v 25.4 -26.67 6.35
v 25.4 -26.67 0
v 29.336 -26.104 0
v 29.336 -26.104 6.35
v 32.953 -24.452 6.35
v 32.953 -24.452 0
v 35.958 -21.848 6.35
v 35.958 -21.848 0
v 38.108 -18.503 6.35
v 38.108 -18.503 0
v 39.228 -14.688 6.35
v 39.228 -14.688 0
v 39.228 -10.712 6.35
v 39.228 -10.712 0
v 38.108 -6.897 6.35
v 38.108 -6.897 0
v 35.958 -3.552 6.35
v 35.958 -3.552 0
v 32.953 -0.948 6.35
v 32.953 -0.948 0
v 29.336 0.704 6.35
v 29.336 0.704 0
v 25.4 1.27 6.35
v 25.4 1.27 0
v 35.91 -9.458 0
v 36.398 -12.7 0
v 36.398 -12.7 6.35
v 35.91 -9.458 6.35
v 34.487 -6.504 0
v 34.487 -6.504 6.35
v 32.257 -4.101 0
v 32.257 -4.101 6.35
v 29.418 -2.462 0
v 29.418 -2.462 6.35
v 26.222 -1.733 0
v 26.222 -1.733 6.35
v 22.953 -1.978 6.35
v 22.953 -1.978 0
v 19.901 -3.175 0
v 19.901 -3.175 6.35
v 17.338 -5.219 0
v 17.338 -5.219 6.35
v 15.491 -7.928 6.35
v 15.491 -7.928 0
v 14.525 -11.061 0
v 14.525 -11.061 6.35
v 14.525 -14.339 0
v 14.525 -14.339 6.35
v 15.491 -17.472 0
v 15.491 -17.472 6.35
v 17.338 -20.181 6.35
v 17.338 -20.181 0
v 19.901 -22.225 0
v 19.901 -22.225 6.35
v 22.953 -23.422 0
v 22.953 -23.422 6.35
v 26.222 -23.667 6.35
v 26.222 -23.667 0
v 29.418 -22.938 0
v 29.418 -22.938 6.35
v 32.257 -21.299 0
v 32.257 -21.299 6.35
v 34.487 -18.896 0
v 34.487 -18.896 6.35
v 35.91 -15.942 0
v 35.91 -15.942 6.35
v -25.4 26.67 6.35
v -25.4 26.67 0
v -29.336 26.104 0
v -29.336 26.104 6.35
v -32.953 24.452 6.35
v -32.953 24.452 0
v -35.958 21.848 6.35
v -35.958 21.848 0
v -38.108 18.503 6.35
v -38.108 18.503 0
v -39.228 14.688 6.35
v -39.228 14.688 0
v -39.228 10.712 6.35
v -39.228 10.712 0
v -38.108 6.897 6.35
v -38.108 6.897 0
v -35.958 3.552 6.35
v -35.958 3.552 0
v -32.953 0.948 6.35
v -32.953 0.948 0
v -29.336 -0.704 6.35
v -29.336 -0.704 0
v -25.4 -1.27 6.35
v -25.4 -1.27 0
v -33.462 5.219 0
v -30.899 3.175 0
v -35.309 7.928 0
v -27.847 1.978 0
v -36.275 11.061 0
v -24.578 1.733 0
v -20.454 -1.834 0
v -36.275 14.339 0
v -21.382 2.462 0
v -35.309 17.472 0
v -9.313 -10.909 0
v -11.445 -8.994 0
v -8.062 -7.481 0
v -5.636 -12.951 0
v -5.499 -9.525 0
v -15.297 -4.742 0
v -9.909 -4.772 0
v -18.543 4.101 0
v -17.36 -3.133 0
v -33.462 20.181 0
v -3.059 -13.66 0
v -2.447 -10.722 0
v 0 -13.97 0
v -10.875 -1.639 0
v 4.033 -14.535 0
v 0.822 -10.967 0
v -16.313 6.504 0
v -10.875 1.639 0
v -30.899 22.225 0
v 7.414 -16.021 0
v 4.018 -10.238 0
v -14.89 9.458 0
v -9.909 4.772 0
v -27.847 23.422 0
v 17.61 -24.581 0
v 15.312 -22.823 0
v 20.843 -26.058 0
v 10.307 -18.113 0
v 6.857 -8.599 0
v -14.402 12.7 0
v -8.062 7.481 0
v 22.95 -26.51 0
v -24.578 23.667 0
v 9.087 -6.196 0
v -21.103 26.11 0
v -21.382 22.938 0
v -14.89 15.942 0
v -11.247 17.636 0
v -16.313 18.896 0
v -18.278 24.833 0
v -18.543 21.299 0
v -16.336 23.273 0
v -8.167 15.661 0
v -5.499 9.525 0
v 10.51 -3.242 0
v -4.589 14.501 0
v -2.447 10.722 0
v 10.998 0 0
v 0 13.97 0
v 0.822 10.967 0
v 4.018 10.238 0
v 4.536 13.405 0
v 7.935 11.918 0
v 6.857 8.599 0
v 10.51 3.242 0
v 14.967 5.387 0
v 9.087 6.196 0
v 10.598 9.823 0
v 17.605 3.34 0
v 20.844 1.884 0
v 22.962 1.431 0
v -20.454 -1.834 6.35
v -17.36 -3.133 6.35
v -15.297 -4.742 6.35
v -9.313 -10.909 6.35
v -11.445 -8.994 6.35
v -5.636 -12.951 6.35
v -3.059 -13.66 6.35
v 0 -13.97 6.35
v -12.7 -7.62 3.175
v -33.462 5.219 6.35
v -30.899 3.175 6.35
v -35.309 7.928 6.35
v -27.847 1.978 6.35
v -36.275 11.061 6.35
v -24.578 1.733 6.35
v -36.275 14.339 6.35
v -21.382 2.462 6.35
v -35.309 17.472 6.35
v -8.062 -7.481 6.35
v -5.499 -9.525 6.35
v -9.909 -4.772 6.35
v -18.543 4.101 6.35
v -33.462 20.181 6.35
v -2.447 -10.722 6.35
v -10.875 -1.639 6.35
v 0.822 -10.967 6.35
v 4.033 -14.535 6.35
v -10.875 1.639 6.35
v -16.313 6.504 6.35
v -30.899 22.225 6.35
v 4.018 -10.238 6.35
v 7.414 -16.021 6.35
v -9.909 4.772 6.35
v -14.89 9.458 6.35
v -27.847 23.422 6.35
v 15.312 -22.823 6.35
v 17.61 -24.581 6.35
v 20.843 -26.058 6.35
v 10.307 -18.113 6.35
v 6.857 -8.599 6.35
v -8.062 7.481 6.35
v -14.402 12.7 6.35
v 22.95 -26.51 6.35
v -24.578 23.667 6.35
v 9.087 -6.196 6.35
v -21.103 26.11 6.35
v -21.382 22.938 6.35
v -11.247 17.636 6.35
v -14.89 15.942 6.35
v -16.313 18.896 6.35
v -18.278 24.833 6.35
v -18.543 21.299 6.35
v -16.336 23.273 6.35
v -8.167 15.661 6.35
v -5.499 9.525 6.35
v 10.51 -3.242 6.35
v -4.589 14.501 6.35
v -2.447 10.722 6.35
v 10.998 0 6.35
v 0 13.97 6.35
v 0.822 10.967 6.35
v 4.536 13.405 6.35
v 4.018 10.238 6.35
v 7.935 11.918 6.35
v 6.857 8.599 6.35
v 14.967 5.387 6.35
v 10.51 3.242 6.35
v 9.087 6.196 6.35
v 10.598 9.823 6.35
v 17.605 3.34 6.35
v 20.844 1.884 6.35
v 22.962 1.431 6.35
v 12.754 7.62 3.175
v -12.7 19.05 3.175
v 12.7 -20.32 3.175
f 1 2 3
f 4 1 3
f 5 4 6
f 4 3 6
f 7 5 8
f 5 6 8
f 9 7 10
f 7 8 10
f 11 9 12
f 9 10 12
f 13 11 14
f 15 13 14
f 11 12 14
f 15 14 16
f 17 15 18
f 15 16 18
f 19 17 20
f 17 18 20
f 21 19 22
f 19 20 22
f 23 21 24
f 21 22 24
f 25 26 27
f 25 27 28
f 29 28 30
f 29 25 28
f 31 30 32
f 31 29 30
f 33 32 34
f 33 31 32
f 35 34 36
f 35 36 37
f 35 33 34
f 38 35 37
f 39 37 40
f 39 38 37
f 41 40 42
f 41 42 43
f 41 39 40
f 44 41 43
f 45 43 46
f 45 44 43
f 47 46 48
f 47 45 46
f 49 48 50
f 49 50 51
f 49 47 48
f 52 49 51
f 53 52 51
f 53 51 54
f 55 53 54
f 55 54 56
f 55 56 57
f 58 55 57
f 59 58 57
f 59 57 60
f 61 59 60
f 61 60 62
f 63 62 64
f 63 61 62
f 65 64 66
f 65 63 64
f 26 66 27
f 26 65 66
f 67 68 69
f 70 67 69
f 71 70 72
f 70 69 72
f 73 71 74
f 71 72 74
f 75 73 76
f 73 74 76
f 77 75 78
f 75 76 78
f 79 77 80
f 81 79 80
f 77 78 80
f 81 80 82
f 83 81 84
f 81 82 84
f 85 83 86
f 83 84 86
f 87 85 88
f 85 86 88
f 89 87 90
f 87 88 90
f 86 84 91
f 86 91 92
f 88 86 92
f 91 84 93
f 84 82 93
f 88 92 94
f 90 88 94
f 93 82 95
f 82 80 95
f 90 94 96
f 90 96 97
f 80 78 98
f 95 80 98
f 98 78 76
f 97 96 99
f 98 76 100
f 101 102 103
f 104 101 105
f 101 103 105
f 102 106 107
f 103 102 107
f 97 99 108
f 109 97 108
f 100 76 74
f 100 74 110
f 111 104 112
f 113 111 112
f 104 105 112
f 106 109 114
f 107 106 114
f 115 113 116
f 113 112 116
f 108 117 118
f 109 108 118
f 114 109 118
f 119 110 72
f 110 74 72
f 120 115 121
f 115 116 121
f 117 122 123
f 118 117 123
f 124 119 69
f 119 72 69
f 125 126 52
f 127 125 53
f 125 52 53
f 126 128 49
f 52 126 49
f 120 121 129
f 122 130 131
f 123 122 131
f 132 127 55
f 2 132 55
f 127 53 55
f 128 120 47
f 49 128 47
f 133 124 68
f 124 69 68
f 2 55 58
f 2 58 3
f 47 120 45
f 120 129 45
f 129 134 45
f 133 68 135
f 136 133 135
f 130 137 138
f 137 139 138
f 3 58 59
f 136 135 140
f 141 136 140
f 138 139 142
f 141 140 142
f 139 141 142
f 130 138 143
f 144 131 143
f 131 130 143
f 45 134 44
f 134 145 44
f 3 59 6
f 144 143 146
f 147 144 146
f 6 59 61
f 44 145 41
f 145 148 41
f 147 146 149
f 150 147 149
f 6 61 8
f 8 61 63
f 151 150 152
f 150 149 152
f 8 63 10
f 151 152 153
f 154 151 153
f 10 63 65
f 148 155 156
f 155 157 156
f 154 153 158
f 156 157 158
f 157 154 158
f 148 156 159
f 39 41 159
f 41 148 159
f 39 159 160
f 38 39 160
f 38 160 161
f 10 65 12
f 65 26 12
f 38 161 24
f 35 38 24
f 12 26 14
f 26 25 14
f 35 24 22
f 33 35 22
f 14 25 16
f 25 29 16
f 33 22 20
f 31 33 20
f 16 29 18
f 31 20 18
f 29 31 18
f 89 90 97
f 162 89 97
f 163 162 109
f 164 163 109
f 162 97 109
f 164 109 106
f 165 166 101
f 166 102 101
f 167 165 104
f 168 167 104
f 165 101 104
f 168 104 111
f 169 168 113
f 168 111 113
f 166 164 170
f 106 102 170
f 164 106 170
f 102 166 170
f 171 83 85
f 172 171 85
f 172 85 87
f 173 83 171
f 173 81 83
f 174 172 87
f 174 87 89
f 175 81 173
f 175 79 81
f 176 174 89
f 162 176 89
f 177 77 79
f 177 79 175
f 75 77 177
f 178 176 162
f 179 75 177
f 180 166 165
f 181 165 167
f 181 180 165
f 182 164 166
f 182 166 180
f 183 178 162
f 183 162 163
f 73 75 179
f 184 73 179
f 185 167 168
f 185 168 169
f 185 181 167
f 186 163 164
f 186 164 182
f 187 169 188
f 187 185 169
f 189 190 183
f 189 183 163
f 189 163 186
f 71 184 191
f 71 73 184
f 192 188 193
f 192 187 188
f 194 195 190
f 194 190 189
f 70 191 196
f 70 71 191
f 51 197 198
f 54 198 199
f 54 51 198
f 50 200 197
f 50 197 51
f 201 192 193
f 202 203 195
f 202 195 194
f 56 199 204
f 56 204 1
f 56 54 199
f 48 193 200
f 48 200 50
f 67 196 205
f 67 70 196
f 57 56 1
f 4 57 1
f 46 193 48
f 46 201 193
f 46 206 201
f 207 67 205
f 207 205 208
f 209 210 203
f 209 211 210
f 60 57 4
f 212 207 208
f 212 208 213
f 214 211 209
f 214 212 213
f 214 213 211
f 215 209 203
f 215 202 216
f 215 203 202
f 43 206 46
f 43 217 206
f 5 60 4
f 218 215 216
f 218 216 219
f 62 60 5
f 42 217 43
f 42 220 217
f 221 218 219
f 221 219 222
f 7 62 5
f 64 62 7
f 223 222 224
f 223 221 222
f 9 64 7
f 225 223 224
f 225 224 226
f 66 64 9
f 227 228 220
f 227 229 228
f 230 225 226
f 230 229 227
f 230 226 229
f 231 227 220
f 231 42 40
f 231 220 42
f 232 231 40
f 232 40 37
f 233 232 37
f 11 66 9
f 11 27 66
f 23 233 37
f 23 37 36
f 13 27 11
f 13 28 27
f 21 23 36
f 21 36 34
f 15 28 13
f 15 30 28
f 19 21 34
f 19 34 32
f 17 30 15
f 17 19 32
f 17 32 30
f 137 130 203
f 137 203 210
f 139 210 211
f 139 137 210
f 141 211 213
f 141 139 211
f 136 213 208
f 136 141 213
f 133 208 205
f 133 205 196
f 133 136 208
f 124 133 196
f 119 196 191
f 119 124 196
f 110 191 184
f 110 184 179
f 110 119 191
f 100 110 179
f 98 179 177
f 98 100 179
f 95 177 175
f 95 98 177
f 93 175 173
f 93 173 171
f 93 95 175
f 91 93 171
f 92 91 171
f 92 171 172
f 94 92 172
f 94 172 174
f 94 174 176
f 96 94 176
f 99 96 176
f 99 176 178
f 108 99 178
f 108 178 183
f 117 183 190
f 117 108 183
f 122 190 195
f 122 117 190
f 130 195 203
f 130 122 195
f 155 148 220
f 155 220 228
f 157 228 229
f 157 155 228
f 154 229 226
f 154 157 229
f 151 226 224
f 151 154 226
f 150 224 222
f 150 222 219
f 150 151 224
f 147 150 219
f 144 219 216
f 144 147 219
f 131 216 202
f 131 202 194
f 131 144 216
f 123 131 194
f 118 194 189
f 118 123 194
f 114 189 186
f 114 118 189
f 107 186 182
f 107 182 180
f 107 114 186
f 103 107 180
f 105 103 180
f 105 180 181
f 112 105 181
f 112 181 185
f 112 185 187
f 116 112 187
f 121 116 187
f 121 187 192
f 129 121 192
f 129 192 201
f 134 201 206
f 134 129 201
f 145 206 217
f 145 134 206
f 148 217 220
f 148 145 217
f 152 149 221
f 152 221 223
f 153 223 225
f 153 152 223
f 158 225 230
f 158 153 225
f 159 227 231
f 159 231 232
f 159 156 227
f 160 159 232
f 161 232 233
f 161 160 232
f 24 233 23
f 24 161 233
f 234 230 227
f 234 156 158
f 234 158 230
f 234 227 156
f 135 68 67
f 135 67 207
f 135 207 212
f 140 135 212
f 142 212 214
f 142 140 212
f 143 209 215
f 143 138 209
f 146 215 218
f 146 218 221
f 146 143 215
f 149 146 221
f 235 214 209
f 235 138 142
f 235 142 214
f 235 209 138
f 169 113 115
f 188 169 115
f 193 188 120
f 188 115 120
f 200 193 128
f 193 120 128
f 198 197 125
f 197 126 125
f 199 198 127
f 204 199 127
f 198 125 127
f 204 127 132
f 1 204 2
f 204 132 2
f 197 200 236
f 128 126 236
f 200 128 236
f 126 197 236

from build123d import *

# Parameters (mm, degrees)
F0_R     = 10.9982
F1_DEPTH = 6.35


with BuildPart() as f1:
    # F0 (on Top) → F1 (new body)
    with BuildSketch(Plane.XY):
        with BuildLine():
            add(Edge.make_bspline(
                [(0, -13.97), (5.7787014373, -13.97), (13.1291277882, -20.32), (18.7630429864, -26.67), (25.4, -26.67)],
                knots=[0, 0, 0, 0, 0.5, 1, 1, 1, 1], degree=3))
            ThreePointArc((25.4, -26.67), (39.37, -12.7), (25.4, 1.27))
            add(Edge.make_bspline(
                [(0, 13.97), (6.853028044, 13.97), (12.6391638998, 7.6416874466), (18.8445616513, 1.27), (25.4, 1.27)],
                knots=[0, 0, 0, 0, 0.500853834, 1, 1, 1, 1], degree=3))
            add(Edge.make_bspline(
                [(-25.4, 26.67), (-17.5831354201, 26.67), (-13.6102278083, 17.9003816405), (-6.4407057817, 14.2221620935), (0, 13.97)],
                knots=[0, 0, 0, 0, 0.5099402335, 1, 1, 1, 1], degree=3))
            ThreePointArc((-25.4, 26.67), (-39.37, 12.7), (-25.4, -1.27))
            add(Edge.make_bspline(
                [(-25.4, -1.27), (-17.5831354201, -1.27), (-13.269427077, -7.7050659785), (-6.678010426, -13.799868043), (0, -13.97)],
                knots=[0, 0, 0, 0, 0.5, 1, 1, 1, 1], degree=3))
        make_face()
        Circle(F0_R, mode=Mode.SUBTRACT)
        with Locations((25.4, -12.7)):
            Circle(F0_R, mode=Mode.SUBTRACT)
        with Locations((-25.4, 12.7)):
            Circle(F0_R, mode=Mode.SUBTRACT)
    extrude(amount=F1_DEPTH)


solid = f1.part
